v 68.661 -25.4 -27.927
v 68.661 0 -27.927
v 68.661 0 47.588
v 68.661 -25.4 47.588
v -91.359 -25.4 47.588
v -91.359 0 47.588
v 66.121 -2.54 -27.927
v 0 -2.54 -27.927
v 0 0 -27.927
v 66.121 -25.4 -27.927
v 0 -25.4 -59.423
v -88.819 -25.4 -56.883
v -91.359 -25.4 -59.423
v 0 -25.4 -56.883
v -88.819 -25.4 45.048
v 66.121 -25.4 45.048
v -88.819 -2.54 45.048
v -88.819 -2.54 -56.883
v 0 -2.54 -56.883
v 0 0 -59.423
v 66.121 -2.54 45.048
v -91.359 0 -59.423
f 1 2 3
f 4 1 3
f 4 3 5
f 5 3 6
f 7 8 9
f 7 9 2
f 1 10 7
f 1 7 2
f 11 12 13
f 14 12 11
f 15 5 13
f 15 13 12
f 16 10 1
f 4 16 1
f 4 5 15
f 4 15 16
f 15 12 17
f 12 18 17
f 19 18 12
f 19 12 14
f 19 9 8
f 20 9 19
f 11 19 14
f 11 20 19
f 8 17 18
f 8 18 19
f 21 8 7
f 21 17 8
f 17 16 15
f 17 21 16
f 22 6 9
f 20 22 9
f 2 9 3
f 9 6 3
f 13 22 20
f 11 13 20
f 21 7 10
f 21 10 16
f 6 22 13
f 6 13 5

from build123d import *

# Parameters (mm, degrees)
F0_W     = 91.358508
F0_H     = 107.0102
F0_W_2   = 68.661492
F1_DEPTH = 25.4
F2_T     = -2.54
F3_W     = 68.661492
F3_H     = 25.4
F4_DEPTH = 31.496


with BuildPart() as f1:
    # F0 (on Front) → F1 (new body)
    with BuildSketch(Plane.XZ):
        with Locations((-45.679254, -5.917441)):
            Rectangle(F0_W, F0_H)
        with Locations((34.330746, -5.917441)):
            Rectangle(F0_W_2, F0_H)
    extrude(amount=F1_DEPTH)

    # F2
    f2_openings = [f1.faces().sort_by_distance(p)[0] for p in [
        (-11.348508, -25.4, -5.917441),
    ]]
    offset(amount=F2_T, openings=f2_openings)

    # F3 (on face) → F4 (cut, symmetric)
    with BuildSketch(Plane(origin=(0, 0, -59.422541), x_dir=(1, 0, 0), z_dir=(0, 0, -1))):
        with Locations((34.330746, 12.7)):
            Rectangle(F3_W, F3_H)
    extrude(amount=F4_DEPTH, both=True, mode=Mode.SUBTRACT)


solid = f1.part
